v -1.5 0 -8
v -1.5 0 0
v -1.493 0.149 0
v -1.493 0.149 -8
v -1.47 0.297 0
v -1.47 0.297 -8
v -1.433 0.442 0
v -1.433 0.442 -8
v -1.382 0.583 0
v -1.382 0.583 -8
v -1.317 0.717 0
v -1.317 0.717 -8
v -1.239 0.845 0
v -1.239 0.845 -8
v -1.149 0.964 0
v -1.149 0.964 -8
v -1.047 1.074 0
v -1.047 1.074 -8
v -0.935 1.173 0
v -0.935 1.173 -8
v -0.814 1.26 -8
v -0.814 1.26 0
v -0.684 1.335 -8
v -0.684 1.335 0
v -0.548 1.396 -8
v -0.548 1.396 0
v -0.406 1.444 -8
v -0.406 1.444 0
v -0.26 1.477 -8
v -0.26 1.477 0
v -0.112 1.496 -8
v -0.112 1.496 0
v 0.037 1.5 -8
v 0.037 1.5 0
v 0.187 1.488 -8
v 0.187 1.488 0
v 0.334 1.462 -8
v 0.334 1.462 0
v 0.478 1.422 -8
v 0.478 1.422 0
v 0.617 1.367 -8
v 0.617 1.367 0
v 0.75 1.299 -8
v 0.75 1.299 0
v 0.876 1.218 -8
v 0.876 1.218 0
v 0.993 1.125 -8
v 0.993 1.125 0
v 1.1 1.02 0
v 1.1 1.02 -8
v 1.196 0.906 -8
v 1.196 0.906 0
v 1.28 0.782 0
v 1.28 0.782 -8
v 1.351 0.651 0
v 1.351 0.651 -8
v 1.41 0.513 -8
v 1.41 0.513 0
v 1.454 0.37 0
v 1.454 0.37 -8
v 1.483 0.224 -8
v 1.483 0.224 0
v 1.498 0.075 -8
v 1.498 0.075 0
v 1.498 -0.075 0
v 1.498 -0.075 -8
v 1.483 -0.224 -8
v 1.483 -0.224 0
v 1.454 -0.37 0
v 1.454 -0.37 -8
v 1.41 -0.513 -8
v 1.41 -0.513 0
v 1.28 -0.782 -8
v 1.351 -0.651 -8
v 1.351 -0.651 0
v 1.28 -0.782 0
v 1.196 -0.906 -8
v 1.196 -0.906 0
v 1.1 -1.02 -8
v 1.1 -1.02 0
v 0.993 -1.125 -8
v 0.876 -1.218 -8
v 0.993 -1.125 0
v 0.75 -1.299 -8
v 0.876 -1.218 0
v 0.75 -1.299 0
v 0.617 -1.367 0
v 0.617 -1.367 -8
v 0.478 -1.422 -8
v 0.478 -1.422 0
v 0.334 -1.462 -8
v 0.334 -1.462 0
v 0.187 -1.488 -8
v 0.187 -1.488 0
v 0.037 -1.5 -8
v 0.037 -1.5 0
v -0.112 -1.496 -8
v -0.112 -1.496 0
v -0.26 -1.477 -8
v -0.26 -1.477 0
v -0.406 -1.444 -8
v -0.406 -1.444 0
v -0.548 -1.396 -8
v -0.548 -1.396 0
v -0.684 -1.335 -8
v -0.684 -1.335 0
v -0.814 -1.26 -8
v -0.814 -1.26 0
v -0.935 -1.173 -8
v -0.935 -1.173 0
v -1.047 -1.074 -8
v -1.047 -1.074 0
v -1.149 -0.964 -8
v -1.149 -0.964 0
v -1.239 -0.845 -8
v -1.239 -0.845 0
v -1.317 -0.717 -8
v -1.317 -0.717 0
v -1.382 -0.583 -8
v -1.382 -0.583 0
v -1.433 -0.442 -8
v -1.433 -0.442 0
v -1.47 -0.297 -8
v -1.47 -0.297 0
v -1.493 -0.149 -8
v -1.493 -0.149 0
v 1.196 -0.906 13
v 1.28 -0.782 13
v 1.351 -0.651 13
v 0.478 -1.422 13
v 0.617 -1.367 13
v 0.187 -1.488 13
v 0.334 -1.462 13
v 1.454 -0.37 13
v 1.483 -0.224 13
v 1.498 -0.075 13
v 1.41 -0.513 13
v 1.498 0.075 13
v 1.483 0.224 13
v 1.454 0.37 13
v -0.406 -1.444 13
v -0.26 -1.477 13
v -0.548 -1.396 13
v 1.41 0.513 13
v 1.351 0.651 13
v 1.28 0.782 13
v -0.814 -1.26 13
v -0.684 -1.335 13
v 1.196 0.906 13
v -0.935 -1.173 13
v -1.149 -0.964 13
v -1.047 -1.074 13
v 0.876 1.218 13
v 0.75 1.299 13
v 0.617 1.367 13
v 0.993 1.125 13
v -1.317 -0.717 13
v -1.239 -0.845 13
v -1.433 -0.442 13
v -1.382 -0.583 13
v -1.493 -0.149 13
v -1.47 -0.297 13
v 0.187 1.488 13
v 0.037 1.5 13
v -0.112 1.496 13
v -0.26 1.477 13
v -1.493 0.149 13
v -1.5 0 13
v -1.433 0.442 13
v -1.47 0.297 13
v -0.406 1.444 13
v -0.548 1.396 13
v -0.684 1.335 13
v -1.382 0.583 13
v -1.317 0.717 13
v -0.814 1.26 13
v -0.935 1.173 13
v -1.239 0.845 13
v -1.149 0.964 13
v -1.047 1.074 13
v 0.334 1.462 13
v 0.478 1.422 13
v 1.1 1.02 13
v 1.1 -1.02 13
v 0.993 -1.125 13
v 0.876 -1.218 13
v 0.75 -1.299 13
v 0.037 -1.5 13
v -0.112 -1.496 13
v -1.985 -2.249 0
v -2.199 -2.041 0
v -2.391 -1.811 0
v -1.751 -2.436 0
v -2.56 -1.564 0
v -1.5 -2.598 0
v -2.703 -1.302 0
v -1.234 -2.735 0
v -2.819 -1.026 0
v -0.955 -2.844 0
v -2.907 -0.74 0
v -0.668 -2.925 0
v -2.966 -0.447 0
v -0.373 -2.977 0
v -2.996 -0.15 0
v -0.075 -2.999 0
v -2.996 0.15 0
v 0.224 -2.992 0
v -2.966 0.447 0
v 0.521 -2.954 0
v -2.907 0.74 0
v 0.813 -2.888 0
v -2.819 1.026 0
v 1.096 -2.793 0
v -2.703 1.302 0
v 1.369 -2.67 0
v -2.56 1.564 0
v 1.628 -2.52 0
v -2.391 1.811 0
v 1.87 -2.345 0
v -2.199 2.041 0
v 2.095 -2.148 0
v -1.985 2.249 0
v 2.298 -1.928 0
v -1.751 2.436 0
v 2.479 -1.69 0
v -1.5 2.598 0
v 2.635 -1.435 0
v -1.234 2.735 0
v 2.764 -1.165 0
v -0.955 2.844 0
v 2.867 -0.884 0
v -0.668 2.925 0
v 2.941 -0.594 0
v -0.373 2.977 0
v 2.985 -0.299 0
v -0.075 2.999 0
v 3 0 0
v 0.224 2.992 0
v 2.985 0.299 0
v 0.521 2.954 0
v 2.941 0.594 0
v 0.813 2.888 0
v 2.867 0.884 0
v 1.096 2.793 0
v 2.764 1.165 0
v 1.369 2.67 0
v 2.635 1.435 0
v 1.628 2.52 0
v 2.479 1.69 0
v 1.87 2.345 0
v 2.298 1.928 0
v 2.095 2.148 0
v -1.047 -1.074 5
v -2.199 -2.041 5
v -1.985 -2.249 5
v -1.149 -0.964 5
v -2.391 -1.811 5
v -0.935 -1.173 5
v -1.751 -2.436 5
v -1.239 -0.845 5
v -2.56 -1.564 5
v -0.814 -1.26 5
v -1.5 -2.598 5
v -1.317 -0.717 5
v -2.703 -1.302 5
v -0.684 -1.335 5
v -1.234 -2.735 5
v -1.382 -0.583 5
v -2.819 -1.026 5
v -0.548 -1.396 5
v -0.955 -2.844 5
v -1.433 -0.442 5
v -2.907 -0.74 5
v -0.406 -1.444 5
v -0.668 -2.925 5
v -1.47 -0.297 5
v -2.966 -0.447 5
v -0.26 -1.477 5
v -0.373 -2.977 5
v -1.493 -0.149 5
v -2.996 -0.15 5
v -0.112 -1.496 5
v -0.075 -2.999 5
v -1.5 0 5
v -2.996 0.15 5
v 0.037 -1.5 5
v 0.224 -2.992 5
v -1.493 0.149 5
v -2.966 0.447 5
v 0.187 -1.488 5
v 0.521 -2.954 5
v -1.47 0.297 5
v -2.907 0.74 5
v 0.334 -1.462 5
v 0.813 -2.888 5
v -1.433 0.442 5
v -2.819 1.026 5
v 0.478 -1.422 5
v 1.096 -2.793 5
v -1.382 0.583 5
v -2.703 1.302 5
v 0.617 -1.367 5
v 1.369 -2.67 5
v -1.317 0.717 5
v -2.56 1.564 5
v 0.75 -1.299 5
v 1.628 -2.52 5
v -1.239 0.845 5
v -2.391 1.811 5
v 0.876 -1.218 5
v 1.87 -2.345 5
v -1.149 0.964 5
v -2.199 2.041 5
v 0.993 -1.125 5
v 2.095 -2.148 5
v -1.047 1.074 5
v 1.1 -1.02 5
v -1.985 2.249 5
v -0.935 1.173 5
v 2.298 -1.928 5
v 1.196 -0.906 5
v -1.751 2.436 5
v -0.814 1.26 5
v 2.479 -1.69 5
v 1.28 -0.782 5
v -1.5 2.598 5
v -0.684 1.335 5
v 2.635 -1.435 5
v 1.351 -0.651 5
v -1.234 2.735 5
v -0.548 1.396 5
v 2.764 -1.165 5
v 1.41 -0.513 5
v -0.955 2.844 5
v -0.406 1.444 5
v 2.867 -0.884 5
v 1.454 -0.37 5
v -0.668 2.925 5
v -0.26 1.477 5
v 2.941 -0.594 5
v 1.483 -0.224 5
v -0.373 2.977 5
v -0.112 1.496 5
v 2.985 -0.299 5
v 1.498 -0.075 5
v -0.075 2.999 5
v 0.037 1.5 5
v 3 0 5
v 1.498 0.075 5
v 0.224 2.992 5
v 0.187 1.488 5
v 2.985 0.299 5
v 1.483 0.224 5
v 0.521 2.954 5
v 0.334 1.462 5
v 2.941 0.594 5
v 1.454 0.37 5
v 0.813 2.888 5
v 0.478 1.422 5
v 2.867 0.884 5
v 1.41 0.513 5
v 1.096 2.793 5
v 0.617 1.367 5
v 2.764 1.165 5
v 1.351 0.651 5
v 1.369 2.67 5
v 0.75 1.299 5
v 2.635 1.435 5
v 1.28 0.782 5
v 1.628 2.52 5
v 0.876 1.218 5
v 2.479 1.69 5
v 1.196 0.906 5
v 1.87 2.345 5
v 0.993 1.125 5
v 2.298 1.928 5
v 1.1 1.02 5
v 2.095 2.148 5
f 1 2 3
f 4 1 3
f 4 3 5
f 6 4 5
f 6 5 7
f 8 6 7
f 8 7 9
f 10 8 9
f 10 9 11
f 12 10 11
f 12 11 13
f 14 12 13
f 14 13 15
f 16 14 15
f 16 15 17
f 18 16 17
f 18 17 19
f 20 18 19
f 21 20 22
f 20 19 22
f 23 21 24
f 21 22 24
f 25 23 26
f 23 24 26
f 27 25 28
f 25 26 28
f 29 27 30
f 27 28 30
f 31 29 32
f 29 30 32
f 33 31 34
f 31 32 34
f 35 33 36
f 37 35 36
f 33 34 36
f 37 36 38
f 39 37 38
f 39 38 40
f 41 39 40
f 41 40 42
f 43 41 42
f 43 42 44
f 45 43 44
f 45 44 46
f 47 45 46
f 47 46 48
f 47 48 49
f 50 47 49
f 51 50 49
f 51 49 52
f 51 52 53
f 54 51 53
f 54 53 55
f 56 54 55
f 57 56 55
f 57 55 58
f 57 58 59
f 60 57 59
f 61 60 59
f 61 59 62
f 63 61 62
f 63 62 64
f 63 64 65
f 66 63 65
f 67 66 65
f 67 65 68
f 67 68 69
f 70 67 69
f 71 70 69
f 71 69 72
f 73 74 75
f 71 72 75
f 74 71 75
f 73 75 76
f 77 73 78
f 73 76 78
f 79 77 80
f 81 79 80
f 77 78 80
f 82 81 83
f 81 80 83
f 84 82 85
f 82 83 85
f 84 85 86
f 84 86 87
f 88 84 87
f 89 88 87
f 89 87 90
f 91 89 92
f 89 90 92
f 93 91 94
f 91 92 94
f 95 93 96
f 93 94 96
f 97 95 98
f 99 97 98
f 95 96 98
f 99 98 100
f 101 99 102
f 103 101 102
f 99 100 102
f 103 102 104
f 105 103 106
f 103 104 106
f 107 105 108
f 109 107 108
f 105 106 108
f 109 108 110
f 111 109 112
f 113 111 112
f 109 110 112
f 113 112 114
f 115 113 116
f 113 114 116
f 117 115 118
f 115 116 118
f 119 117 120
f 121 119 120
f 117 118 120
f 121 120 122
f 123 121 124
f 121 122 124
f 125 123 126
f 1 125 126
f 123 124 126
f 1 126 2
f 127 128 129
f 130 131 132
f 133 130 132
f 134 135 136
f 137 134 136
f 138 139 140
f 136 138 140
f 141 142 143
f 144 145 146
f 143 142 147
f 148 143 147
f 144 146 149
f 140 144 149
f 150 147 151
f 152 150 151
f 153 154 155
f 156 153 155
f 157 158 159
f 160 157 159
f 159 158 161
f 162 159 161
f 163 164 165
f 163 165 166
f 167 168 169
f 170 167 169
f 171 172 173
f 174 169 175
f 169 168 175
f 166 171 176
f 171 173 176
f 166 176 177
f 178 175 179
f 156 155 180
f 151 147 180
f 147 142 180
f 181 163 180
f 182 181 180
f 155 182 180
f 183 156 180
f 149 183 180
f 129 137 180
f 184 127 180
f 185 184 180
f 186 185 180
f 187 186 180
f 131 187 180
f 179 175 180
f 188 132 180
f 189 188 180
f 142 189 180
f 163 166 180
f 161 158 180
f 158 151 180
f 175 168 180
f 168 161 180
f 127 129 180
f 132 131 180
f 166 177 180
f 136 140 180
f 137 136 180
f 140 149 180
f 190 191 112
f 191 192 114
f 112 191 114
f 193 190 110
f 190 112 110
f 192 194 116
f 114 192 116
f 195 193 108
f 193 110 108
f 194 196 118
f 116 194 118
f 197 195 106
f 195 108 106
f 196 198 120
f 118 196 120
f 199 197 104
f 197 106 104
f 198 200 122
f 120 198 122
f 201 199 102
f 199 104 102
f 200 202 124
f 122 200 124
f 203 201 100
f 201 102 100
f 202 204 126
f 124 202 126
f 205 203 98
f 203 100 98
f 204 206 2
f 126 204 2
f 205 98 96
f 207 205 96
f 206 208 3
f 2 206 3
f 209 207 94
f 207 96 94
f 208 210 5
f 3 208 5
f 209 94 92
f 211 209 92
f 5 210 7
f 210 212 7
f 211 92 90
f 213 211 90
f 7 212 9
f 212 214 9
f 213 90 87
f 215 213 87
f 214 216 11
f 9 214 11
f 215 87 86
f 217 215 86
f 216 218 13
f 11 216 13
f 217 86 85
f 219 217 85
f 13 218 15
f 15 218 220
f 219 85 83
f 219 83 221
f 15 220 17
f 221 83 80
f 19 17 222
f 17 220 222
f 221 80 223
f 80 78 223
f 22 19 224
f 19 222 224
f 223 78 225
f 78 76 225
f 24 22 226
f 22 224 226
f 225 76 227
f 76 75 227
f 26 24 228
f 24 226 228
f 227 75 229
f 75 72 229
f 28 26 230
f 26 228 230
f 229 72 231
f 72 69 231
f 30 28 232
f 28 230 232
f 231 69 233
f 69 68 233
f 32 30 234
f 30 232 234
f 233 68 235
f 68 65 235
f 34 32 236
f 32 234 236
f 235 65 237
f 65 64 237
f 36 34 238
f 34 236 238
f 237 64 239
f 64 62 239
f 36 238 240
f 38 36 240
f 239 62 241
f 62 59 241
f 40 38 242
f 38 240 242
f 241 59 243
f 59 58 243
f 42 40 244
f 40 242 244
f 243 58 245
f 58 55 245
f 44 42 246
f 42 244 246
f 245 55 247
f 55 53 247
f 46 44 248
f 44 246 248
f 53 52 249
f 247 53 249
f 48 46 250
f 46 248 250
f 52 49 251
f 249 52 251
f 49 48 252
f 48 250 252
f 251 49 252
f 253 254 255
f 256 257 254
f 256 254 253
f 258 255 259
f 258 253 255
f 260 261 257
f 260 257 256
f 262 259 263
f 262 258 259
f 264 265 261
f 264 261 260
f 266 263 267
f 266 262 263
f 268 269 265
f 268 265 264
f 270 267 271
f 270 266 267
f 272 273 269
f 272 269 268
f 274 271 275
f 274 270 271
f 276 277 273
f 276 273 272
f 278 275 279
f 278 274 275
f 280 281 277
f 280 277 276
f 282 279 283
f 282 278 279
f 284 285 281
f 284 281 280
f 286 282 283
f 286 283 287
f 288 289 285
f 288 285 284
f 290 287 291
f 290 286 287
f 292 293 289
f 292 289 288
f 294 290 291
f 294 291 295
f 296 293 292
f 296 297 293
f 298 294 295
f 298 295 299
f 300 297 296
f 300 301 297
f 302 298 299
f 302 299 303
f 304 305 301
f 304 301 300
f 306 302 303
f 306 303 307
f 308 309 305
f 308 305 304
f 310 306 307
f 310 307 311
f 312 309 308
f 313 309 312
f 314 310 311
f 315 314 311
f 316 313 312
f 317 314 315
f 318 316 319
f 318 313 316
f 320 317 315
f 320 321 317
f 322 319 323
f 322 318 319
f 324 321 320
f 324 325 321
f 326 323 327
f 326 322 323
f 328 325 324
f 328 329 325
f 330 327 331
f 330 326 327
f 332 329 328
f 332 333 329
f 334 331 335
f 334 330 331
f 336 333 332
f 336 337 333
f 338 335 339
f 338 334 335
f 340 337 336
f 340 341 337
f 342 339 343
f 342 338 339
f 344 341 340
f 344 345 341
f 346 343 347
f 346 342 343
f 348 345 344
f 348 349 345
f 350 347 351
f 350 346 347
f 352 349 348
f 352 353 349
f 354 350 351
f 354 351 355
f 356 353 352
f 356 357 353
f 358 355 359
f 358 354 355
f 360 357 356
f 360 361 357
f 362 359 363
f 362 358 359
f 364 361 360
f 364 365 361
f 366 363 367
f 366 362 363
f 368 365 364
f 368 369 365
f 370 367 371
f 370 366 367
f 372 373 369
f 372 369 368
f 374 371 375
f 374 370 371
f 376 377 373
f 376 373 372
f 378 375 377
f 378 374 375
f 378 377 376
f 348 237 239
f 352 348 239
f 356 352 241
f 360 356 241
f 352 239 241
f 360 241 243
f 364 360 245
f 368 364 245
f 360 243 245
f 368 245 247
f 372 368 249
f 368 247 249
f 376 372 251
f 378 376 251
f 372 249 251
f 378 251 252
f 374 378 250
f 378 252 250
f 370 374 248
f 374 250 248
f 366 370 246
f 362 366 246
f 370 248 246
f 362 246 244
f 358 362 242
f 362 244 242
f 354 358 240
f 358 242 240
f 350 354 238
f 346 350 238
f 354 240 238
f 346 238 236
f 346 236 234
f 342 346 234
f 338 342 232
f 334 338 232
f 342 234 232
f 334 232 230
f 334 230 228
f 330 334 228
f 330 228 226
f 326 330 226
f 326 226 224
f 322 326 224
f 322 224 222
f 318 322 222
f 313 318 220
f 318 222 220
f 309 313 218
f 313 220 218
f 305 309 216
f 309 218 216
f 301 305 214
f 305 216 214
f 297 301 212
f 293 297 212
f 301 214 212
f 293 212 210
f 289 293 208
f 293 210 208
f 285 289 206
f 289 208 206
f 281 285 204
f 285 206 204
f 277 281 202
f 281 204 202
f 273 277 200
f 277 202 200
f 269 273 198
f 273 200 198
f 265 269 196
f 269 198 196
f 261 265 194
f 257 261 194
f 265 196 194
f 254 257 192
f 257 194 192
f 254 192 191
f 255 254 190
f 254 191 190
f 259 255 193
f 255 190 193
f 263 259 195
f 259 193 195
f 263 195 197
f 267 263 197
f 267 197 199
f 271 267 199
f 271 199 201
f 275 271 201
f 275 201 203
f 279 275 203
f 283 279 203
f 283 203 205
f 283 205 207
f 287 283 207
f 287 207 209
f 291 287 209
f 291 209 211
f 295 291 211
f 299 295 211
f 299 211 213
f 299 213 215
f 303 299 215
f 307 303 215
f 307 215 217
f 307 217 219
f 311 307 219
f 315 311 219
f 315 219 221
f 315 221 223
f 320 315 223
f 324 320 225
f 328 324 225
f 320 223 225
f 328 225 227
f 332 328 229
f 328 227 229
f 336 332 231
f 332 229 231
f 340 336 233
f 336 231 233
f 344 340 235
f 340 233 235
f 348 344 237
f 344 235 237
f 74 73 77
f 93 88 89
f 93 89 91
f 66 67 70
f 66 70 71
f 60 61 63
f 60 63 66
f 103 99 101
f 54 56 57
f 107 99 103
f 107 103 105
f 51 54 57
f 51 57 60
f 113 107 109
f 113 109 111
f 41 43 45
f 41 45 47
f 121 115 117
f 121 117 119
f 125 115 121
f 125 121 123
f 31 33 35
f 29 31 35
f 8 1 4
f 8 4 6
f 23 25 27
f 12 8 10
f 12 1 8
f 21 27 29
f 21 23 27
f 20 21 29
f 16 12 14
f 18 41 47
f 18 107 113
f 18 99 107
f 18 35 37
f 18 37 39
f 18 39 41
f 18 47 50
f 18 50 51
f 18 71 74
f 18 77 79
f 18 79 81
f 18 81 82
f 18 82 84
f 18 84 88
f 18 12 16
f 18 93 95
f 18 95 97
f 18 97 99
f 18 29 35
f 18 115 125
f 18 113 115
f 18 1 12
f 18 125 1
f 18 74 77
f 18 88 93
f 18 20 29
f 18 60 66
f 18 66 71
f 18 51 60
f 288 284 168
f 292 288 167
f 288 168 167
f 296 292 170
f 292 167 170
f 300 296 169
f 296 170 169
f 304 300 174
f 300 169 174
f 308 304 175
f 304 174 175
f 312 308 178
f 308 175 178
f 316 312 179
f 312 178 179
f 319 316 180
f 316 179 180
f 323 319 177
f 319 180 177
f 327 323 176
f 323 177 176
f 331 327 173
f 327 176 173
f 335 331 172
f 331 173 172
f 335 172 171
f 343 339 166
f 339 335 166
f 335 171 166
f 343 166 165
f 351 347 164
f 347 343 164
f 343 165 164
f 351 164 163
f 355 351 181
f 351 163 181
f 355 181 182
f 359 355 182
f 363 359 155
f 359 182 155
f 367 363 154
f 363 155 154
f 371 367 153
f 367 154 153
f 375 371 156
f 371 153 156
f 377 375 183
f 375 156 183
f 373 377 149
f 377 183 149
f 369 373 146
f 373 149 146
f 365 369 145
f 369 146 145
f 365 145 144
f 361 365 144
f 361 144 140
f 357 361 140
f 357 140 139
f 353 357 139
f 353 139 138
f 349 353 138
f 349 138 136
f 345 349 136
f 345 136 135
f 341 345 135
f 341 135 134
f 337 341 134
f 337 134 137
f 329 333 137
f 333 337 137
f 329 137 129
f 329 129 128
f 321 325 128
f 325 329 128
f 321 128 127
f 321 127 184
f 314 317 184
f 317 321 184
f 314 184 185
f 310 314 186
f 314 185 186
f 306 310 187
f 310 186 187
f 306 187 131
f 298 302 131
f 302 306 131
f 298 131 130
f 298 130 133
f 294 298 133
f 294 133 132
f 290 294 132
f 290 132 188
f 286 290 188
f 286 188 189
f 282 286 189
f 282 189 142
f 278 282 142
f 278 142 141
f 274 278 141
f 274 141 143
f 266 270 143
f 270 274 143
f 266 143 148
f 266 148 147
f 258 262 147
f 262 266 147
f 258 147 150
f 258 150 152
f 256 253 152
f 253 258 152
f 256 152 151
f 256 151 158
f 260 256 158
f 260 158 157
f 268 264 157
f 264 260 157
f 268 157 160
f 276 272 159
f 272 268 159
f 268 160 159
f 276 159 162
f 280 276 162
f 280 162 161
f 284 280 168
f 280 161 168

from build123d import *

# Parameters (mm, degrees)
SKETCH1_R                                        = 3
BOSS_EXTRUDE1_DLUGOSC_CALKOWITA_S4_DEPTH         = 5
BOSS_EXTRUDE2_PRZEDLUZENIE_DO_MONTAZU_DEPTH      = 8
BOSS_EXTRUDE2_PRZEDLUZENIE_DO_MONTAZU_DEPTH_BACK = 13
SKETCH2_R                                        = 1.5


with BuildPart() as part:
    # Sketch1 → Boss-Extrude1 dlugosc calkowita S4 (new body)
    with BuildSketch(Plane.XY):
        Circle(SKETCH1_R)
    extrude(amount=BOSS_EXTRUDE1_DLUGOSC_CALKOWITA_S4_DEPTH)

    # Sketch2 → Boss-Extrude2 przedluzenie do montazu (add, two sides: drawn at the far end of the back side and taken through both)
    with BuildSketch(Plane(origin=(0, 0, 0), x_dir=(-1, 0, 0), z_dir=(0, 0, -1)).offset(-BOSS_EXTRUDE2_PRZEDLUZENIE_DO_MONTAZU_DEPTH_BACK)):
        Circle(SKETCH2_R)
    extrude(amount=BOSS_EXTRUDE2_PRZEDLUZENIE_DO_MONTAZU_DEPTH + BOSS_EXTRUDE2_PRZEDLUZENIE_DO_MONTAZU_DEPTH_BACK)


solid = part.part
